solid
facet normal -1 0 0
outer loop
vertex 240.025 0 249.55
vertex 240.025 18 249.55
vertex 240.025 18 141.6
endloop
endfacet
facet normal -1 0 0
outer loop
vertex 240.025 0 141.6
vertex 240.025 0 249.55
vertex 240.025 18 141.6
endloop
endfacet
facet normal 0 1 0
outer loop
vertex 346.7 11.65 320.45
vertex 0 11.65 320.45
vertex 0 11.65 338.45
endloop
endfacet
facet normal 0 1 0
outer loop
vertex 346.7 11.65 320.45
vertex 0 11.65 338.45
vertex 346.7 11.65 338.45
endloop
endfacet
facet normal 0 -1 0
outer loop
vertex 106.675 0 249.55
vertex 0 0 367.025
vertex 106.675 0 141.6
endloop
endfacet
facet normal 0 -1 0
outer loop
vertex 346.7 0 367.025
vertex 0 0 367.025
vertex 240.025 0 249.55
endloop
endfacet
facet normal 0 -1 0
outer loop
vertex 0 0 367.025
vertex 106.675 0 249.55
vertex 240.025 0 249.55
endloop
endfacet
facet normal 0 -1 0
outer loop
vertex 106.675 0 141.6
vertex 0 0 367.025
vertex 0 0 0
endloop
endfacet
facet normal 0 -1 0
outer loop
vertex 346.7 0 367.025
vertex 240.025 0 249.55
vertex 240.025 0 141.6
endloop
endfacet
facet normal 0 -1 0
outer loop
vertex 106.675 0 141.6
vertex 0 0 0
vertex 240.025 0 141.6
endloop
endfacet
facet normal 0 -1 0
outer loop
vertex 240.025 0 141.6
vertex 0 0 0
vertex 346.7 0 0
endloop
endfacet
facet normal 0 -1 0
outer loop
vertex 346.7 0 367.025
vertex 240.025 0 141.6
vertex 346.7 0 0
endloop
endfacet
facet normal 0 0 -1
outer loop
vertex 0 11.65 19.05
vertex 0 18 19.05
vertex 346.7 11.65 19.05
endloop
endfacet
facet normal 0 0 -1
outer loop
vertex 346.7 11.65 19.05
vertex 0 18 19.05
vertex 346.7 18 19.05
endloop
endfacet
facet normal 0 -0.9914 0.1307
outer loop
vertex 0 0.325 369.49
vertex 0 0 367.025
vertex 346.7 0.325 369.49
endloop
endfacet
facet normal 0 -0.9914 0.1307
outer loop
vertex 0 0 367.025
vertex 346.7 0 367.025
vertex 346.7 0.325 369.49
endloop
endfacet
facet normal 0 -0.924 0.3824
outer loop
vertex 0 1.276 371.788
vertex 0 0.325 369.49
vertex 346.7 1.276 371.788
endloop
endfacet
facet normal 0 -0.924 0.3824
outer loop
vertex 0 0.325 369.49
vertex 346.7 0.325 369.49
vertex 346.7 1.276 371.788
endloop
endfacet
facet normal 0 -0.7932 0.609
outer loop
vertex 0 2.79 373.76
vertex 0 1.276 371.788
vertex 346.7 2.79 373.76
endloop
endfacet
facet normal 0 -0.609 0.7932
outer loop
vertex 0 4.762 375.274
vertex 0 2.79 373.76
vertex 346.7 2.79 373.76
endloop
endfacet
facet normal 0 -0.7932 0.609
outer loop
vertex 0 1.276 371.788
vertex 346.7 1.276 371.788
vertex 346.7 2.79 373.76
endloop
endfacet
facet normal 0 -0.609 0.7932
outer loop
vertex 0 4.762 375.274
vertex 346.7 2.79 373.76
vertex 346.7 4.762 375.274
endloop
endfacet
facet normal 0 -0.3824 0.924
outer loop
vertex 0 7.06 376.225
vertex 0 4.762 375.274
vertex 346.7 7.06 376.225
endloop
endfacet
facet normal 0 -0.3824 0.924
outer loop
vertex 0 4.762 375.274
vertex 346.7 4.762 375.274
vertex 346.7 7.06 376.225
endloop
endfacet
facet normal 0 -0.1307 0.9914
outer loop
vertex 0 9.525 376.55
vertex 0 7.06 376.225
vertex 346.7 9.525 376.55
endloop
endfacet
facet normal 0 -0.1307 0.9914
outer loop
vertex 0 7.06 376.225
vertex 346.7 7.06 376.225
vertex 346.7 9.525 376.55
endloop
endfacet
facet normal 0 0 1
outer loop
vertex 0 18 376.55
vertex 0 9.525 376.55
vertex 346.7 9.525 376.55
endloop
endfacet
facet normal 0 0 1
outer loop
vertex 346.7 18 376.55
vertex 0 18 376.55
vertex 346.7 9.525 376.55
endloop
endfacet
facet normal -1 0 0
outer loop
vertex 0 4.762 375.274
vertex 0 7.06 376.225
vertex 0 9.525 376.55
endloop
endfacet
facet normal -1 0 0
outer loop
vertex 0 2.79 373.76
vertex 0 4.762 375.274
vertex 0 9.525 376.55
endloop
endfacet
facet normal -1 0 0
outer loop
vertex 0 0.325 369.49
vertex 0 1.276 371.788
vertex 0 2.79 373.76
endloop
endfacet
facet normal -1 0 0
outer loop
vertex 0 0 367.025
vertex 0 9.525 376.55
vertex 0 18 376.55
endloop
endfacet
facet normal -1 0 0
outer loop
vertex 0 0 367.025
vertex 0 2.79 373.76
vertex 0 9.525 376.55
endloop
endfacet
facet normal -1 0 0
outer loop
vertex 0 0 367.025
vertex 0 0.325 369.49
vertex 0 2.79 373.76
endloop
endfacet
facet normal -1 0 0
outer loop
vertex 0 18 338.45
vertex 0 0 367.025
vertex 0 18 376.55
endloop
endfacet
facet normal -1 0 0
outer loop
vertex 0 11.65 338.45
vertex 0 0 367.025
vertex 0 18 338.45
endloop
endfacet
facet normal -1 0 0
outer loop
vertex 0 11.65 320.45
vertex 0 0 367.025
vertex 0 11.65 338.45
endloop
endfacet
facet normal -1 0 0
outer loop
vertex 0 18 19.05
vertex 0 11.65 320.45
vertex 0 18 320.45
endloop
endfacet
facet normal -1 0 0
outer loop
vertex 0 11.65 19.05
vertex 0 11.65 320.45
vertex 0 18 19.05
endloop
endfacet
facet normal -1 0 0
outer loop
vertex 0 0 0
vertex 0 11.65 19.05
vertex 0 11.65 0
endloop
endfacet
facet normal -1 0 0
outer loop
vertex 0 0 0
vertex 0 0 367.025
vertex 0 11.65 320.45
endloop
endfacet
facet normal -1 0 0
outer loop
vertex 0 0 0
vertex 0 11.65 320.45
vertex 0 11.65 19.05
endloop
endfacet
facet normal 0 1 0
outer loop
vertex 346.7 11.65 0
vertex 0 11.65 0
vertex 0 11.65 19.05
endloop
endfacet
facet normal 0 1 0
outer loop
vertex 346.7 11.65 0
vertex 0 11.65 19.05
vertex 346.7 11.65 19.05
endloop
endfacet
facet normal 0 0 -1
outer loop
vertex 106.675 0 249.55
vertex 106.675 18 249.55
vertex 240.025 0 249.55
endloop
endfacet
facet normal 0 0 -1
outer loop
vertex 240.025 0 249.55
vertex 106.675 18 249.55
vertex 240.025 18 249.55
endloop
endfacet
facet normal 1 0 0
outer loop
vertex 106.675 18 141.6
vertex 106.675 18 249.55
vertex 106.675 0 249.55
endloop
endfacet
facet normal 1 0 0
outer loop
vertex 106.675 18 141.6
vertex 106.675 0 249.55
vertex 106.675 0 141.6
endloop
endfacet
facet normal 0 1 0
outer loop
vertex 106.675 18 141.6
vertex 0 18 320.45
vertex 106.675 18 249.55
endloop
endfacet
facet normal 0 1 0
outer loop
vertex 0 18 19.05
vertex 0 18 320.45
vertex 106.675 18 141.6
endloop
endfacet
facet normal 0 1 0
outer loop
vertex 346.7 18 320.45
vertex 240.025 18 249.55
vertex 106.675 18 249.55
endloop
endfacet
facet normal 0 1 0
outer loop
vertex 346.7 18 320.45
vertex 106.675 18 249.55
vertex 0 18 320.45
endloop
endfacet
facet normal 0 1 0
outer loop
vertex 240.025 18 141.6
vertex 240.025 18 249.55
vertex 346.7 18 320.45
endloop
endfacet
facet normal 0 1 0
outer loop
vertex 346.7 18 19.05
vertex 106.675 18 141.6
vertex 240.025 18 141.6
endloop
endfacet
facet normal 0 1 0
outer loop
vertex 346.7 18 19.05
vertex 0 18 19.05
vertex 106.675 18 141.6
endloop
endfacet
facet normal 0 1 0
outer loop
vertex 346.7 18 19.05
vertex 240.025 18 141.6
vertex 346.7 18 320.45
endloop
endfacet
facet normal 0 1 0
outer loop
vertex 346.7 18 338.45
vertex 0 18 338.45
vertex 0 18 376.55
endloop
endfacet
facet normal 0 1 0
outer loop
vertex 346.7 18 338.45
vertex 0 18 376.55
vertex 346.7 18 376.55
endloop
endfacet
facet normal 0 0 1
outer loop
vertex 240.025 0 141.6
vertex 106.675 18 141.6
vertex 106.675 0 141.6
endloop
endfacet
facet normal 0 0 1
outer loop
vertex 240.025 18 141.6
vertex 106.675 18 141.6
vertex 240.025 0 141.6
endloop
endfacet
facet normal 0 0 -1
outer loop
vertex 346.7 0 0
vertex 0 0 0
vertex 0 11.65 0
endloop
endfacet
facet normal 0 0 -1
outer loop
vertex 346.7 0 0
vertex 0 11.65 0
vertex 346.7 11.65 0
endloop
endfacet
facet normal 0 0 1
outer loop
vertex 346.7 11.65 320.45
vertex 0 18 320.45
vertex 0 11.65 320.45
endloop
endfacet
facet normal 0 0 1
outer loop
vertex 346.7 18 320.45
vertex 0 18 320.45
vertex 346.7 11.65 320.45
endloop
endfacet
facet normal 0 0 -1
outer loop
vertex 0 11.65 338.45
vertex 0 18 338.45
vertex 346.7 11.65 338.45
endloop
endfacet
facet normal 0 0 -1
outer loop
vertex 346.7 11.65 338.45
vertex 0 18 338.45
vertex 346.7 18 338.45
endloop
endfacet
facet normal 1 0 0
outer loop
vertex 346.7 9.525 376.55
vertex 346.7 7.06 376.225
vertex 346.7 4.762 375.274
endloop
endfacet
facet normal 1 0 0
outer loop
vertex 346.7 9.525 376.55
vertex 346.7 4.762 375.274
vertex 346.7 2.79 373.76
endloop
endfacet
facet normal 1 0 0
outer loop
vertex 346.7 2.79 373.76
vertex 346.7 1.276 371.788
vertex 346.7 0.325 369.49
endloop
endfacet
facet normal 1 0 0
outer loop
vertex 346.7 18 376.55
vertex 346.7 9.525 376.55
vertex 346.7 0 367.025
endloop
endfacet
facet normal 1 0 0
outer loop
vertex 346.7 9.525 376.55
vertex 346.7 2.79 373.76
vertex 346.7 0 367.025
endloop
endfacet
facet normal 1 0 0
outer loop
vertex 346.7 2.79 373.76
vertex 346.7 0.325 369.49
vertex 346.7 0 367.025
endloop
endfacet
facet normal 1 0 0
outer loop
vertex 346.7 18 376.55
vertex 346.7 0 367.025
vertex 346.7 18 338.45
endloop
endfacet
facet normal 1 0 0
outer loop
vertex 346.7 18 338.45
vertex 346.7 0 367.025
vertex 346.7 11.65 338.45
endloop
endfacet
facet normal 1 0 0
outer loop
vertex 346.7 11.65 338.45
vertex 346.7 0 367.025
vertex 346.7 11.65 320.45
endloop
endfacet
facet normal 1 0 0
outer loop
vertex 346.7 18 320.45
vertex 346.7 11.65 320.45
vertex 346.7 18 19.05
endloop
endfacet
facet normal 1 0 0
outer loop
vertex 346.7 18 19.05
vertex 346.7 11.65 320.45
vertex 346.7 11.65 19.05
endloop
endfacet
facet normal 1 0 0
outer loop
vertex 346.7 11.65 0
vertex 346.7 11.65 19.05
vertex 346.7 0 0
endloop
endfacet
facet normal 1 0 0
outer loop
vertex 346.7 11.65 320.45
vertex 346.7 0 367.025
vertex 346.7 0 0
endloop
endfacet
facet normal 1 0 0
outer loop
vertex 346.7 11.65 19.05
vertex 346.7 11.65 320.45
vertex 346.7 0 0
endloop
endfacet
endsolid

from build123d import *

# Parameters (mm, degrees)
SKETCH1_W           = 346.7
SKETCH1_H           = 376.55000001
BOSS_EXTRUDE1_DEPTH = 18
SKETCH2_W           = 346.7
SKETCH2_H           = 18
CUT_EXTRUDE1_DEPTH  = 6.35
SKETCH3_W           = 133.35
SKETCH3_H           = 107.95
CUT_EXTRUDE3_DEPTH  = 19
FILLET1_R           = 9.525
SKETCH6_W           = 346.7
SKETCH6_H           = 19.05
CUT_EXTRUDE4_DEPTH  = 6.35


with BuildPart() as part:
    # Sketch1 → Boss-Extrude1 (new body)
    with BuildSketch(Plane(origin=(0, 0, 0), x_dir=(1, 0, 0), z_dir=(0, 1, 0))):
        with Locations((173.35, -188.275000005)):
            Rectangle(SKETCH1_W, SKETCH1_H)
    extrude(amount=BOSS_EXTRUDE1_DEPTH)

    # Sketch2 → Cut-Extrude1 (cut)
    with BuildSketch(Plane(origin=(0, 18, 0), x_dir=(1, 0, 0), z_dir=(0, 1, 0))):
        with Locations((173.35, -329.45000001)):
            Rectangle(SKETCH2_W, SKETCH2_H)
    extrude(amount=-CUT_EXTRUDE1_DEPTH, mode=Mode.SUBTRACT)

    # Sketch3 → Cut-Extrude3 (cut, through all)
    with BuildSketch(Plane(origin=(0, 18, 0), x_dir=(1, 0, 0), z_dir=(0, 1, 0))):
        with Locations((173.35, -195.57500001)):
            Rectangle(SKETCH3_W, SKETCH3_H)
    extrude(amount=-CUT_EXTRUDE3_DEPTH, mode=Mode.SUBTRACT)

    # Fillet1
    fillet1_edges = [part.edges().sort_by_distance(p)[0] for p in [
        (173.35, 0, 376.55000001),
    ]]
    fillet(fillet1_edges, radius=FILLET1_R)

    # Sketch6 → Cut-Extrude4 (cut)
    with BuildSketch(Plane(origin=(0, 18, 0), x_dir=(1, 0, 0), z_dir=(0, 1, 0))):
        with Locations((173.35, -9.525)):
            Rectangle(SKETCH6_W, SKETCH6_H)
    extrude(amount=-CUT_EXTRUDE4_DEPTH, mode=Mode.SUBTRACT)


solid = part.part
